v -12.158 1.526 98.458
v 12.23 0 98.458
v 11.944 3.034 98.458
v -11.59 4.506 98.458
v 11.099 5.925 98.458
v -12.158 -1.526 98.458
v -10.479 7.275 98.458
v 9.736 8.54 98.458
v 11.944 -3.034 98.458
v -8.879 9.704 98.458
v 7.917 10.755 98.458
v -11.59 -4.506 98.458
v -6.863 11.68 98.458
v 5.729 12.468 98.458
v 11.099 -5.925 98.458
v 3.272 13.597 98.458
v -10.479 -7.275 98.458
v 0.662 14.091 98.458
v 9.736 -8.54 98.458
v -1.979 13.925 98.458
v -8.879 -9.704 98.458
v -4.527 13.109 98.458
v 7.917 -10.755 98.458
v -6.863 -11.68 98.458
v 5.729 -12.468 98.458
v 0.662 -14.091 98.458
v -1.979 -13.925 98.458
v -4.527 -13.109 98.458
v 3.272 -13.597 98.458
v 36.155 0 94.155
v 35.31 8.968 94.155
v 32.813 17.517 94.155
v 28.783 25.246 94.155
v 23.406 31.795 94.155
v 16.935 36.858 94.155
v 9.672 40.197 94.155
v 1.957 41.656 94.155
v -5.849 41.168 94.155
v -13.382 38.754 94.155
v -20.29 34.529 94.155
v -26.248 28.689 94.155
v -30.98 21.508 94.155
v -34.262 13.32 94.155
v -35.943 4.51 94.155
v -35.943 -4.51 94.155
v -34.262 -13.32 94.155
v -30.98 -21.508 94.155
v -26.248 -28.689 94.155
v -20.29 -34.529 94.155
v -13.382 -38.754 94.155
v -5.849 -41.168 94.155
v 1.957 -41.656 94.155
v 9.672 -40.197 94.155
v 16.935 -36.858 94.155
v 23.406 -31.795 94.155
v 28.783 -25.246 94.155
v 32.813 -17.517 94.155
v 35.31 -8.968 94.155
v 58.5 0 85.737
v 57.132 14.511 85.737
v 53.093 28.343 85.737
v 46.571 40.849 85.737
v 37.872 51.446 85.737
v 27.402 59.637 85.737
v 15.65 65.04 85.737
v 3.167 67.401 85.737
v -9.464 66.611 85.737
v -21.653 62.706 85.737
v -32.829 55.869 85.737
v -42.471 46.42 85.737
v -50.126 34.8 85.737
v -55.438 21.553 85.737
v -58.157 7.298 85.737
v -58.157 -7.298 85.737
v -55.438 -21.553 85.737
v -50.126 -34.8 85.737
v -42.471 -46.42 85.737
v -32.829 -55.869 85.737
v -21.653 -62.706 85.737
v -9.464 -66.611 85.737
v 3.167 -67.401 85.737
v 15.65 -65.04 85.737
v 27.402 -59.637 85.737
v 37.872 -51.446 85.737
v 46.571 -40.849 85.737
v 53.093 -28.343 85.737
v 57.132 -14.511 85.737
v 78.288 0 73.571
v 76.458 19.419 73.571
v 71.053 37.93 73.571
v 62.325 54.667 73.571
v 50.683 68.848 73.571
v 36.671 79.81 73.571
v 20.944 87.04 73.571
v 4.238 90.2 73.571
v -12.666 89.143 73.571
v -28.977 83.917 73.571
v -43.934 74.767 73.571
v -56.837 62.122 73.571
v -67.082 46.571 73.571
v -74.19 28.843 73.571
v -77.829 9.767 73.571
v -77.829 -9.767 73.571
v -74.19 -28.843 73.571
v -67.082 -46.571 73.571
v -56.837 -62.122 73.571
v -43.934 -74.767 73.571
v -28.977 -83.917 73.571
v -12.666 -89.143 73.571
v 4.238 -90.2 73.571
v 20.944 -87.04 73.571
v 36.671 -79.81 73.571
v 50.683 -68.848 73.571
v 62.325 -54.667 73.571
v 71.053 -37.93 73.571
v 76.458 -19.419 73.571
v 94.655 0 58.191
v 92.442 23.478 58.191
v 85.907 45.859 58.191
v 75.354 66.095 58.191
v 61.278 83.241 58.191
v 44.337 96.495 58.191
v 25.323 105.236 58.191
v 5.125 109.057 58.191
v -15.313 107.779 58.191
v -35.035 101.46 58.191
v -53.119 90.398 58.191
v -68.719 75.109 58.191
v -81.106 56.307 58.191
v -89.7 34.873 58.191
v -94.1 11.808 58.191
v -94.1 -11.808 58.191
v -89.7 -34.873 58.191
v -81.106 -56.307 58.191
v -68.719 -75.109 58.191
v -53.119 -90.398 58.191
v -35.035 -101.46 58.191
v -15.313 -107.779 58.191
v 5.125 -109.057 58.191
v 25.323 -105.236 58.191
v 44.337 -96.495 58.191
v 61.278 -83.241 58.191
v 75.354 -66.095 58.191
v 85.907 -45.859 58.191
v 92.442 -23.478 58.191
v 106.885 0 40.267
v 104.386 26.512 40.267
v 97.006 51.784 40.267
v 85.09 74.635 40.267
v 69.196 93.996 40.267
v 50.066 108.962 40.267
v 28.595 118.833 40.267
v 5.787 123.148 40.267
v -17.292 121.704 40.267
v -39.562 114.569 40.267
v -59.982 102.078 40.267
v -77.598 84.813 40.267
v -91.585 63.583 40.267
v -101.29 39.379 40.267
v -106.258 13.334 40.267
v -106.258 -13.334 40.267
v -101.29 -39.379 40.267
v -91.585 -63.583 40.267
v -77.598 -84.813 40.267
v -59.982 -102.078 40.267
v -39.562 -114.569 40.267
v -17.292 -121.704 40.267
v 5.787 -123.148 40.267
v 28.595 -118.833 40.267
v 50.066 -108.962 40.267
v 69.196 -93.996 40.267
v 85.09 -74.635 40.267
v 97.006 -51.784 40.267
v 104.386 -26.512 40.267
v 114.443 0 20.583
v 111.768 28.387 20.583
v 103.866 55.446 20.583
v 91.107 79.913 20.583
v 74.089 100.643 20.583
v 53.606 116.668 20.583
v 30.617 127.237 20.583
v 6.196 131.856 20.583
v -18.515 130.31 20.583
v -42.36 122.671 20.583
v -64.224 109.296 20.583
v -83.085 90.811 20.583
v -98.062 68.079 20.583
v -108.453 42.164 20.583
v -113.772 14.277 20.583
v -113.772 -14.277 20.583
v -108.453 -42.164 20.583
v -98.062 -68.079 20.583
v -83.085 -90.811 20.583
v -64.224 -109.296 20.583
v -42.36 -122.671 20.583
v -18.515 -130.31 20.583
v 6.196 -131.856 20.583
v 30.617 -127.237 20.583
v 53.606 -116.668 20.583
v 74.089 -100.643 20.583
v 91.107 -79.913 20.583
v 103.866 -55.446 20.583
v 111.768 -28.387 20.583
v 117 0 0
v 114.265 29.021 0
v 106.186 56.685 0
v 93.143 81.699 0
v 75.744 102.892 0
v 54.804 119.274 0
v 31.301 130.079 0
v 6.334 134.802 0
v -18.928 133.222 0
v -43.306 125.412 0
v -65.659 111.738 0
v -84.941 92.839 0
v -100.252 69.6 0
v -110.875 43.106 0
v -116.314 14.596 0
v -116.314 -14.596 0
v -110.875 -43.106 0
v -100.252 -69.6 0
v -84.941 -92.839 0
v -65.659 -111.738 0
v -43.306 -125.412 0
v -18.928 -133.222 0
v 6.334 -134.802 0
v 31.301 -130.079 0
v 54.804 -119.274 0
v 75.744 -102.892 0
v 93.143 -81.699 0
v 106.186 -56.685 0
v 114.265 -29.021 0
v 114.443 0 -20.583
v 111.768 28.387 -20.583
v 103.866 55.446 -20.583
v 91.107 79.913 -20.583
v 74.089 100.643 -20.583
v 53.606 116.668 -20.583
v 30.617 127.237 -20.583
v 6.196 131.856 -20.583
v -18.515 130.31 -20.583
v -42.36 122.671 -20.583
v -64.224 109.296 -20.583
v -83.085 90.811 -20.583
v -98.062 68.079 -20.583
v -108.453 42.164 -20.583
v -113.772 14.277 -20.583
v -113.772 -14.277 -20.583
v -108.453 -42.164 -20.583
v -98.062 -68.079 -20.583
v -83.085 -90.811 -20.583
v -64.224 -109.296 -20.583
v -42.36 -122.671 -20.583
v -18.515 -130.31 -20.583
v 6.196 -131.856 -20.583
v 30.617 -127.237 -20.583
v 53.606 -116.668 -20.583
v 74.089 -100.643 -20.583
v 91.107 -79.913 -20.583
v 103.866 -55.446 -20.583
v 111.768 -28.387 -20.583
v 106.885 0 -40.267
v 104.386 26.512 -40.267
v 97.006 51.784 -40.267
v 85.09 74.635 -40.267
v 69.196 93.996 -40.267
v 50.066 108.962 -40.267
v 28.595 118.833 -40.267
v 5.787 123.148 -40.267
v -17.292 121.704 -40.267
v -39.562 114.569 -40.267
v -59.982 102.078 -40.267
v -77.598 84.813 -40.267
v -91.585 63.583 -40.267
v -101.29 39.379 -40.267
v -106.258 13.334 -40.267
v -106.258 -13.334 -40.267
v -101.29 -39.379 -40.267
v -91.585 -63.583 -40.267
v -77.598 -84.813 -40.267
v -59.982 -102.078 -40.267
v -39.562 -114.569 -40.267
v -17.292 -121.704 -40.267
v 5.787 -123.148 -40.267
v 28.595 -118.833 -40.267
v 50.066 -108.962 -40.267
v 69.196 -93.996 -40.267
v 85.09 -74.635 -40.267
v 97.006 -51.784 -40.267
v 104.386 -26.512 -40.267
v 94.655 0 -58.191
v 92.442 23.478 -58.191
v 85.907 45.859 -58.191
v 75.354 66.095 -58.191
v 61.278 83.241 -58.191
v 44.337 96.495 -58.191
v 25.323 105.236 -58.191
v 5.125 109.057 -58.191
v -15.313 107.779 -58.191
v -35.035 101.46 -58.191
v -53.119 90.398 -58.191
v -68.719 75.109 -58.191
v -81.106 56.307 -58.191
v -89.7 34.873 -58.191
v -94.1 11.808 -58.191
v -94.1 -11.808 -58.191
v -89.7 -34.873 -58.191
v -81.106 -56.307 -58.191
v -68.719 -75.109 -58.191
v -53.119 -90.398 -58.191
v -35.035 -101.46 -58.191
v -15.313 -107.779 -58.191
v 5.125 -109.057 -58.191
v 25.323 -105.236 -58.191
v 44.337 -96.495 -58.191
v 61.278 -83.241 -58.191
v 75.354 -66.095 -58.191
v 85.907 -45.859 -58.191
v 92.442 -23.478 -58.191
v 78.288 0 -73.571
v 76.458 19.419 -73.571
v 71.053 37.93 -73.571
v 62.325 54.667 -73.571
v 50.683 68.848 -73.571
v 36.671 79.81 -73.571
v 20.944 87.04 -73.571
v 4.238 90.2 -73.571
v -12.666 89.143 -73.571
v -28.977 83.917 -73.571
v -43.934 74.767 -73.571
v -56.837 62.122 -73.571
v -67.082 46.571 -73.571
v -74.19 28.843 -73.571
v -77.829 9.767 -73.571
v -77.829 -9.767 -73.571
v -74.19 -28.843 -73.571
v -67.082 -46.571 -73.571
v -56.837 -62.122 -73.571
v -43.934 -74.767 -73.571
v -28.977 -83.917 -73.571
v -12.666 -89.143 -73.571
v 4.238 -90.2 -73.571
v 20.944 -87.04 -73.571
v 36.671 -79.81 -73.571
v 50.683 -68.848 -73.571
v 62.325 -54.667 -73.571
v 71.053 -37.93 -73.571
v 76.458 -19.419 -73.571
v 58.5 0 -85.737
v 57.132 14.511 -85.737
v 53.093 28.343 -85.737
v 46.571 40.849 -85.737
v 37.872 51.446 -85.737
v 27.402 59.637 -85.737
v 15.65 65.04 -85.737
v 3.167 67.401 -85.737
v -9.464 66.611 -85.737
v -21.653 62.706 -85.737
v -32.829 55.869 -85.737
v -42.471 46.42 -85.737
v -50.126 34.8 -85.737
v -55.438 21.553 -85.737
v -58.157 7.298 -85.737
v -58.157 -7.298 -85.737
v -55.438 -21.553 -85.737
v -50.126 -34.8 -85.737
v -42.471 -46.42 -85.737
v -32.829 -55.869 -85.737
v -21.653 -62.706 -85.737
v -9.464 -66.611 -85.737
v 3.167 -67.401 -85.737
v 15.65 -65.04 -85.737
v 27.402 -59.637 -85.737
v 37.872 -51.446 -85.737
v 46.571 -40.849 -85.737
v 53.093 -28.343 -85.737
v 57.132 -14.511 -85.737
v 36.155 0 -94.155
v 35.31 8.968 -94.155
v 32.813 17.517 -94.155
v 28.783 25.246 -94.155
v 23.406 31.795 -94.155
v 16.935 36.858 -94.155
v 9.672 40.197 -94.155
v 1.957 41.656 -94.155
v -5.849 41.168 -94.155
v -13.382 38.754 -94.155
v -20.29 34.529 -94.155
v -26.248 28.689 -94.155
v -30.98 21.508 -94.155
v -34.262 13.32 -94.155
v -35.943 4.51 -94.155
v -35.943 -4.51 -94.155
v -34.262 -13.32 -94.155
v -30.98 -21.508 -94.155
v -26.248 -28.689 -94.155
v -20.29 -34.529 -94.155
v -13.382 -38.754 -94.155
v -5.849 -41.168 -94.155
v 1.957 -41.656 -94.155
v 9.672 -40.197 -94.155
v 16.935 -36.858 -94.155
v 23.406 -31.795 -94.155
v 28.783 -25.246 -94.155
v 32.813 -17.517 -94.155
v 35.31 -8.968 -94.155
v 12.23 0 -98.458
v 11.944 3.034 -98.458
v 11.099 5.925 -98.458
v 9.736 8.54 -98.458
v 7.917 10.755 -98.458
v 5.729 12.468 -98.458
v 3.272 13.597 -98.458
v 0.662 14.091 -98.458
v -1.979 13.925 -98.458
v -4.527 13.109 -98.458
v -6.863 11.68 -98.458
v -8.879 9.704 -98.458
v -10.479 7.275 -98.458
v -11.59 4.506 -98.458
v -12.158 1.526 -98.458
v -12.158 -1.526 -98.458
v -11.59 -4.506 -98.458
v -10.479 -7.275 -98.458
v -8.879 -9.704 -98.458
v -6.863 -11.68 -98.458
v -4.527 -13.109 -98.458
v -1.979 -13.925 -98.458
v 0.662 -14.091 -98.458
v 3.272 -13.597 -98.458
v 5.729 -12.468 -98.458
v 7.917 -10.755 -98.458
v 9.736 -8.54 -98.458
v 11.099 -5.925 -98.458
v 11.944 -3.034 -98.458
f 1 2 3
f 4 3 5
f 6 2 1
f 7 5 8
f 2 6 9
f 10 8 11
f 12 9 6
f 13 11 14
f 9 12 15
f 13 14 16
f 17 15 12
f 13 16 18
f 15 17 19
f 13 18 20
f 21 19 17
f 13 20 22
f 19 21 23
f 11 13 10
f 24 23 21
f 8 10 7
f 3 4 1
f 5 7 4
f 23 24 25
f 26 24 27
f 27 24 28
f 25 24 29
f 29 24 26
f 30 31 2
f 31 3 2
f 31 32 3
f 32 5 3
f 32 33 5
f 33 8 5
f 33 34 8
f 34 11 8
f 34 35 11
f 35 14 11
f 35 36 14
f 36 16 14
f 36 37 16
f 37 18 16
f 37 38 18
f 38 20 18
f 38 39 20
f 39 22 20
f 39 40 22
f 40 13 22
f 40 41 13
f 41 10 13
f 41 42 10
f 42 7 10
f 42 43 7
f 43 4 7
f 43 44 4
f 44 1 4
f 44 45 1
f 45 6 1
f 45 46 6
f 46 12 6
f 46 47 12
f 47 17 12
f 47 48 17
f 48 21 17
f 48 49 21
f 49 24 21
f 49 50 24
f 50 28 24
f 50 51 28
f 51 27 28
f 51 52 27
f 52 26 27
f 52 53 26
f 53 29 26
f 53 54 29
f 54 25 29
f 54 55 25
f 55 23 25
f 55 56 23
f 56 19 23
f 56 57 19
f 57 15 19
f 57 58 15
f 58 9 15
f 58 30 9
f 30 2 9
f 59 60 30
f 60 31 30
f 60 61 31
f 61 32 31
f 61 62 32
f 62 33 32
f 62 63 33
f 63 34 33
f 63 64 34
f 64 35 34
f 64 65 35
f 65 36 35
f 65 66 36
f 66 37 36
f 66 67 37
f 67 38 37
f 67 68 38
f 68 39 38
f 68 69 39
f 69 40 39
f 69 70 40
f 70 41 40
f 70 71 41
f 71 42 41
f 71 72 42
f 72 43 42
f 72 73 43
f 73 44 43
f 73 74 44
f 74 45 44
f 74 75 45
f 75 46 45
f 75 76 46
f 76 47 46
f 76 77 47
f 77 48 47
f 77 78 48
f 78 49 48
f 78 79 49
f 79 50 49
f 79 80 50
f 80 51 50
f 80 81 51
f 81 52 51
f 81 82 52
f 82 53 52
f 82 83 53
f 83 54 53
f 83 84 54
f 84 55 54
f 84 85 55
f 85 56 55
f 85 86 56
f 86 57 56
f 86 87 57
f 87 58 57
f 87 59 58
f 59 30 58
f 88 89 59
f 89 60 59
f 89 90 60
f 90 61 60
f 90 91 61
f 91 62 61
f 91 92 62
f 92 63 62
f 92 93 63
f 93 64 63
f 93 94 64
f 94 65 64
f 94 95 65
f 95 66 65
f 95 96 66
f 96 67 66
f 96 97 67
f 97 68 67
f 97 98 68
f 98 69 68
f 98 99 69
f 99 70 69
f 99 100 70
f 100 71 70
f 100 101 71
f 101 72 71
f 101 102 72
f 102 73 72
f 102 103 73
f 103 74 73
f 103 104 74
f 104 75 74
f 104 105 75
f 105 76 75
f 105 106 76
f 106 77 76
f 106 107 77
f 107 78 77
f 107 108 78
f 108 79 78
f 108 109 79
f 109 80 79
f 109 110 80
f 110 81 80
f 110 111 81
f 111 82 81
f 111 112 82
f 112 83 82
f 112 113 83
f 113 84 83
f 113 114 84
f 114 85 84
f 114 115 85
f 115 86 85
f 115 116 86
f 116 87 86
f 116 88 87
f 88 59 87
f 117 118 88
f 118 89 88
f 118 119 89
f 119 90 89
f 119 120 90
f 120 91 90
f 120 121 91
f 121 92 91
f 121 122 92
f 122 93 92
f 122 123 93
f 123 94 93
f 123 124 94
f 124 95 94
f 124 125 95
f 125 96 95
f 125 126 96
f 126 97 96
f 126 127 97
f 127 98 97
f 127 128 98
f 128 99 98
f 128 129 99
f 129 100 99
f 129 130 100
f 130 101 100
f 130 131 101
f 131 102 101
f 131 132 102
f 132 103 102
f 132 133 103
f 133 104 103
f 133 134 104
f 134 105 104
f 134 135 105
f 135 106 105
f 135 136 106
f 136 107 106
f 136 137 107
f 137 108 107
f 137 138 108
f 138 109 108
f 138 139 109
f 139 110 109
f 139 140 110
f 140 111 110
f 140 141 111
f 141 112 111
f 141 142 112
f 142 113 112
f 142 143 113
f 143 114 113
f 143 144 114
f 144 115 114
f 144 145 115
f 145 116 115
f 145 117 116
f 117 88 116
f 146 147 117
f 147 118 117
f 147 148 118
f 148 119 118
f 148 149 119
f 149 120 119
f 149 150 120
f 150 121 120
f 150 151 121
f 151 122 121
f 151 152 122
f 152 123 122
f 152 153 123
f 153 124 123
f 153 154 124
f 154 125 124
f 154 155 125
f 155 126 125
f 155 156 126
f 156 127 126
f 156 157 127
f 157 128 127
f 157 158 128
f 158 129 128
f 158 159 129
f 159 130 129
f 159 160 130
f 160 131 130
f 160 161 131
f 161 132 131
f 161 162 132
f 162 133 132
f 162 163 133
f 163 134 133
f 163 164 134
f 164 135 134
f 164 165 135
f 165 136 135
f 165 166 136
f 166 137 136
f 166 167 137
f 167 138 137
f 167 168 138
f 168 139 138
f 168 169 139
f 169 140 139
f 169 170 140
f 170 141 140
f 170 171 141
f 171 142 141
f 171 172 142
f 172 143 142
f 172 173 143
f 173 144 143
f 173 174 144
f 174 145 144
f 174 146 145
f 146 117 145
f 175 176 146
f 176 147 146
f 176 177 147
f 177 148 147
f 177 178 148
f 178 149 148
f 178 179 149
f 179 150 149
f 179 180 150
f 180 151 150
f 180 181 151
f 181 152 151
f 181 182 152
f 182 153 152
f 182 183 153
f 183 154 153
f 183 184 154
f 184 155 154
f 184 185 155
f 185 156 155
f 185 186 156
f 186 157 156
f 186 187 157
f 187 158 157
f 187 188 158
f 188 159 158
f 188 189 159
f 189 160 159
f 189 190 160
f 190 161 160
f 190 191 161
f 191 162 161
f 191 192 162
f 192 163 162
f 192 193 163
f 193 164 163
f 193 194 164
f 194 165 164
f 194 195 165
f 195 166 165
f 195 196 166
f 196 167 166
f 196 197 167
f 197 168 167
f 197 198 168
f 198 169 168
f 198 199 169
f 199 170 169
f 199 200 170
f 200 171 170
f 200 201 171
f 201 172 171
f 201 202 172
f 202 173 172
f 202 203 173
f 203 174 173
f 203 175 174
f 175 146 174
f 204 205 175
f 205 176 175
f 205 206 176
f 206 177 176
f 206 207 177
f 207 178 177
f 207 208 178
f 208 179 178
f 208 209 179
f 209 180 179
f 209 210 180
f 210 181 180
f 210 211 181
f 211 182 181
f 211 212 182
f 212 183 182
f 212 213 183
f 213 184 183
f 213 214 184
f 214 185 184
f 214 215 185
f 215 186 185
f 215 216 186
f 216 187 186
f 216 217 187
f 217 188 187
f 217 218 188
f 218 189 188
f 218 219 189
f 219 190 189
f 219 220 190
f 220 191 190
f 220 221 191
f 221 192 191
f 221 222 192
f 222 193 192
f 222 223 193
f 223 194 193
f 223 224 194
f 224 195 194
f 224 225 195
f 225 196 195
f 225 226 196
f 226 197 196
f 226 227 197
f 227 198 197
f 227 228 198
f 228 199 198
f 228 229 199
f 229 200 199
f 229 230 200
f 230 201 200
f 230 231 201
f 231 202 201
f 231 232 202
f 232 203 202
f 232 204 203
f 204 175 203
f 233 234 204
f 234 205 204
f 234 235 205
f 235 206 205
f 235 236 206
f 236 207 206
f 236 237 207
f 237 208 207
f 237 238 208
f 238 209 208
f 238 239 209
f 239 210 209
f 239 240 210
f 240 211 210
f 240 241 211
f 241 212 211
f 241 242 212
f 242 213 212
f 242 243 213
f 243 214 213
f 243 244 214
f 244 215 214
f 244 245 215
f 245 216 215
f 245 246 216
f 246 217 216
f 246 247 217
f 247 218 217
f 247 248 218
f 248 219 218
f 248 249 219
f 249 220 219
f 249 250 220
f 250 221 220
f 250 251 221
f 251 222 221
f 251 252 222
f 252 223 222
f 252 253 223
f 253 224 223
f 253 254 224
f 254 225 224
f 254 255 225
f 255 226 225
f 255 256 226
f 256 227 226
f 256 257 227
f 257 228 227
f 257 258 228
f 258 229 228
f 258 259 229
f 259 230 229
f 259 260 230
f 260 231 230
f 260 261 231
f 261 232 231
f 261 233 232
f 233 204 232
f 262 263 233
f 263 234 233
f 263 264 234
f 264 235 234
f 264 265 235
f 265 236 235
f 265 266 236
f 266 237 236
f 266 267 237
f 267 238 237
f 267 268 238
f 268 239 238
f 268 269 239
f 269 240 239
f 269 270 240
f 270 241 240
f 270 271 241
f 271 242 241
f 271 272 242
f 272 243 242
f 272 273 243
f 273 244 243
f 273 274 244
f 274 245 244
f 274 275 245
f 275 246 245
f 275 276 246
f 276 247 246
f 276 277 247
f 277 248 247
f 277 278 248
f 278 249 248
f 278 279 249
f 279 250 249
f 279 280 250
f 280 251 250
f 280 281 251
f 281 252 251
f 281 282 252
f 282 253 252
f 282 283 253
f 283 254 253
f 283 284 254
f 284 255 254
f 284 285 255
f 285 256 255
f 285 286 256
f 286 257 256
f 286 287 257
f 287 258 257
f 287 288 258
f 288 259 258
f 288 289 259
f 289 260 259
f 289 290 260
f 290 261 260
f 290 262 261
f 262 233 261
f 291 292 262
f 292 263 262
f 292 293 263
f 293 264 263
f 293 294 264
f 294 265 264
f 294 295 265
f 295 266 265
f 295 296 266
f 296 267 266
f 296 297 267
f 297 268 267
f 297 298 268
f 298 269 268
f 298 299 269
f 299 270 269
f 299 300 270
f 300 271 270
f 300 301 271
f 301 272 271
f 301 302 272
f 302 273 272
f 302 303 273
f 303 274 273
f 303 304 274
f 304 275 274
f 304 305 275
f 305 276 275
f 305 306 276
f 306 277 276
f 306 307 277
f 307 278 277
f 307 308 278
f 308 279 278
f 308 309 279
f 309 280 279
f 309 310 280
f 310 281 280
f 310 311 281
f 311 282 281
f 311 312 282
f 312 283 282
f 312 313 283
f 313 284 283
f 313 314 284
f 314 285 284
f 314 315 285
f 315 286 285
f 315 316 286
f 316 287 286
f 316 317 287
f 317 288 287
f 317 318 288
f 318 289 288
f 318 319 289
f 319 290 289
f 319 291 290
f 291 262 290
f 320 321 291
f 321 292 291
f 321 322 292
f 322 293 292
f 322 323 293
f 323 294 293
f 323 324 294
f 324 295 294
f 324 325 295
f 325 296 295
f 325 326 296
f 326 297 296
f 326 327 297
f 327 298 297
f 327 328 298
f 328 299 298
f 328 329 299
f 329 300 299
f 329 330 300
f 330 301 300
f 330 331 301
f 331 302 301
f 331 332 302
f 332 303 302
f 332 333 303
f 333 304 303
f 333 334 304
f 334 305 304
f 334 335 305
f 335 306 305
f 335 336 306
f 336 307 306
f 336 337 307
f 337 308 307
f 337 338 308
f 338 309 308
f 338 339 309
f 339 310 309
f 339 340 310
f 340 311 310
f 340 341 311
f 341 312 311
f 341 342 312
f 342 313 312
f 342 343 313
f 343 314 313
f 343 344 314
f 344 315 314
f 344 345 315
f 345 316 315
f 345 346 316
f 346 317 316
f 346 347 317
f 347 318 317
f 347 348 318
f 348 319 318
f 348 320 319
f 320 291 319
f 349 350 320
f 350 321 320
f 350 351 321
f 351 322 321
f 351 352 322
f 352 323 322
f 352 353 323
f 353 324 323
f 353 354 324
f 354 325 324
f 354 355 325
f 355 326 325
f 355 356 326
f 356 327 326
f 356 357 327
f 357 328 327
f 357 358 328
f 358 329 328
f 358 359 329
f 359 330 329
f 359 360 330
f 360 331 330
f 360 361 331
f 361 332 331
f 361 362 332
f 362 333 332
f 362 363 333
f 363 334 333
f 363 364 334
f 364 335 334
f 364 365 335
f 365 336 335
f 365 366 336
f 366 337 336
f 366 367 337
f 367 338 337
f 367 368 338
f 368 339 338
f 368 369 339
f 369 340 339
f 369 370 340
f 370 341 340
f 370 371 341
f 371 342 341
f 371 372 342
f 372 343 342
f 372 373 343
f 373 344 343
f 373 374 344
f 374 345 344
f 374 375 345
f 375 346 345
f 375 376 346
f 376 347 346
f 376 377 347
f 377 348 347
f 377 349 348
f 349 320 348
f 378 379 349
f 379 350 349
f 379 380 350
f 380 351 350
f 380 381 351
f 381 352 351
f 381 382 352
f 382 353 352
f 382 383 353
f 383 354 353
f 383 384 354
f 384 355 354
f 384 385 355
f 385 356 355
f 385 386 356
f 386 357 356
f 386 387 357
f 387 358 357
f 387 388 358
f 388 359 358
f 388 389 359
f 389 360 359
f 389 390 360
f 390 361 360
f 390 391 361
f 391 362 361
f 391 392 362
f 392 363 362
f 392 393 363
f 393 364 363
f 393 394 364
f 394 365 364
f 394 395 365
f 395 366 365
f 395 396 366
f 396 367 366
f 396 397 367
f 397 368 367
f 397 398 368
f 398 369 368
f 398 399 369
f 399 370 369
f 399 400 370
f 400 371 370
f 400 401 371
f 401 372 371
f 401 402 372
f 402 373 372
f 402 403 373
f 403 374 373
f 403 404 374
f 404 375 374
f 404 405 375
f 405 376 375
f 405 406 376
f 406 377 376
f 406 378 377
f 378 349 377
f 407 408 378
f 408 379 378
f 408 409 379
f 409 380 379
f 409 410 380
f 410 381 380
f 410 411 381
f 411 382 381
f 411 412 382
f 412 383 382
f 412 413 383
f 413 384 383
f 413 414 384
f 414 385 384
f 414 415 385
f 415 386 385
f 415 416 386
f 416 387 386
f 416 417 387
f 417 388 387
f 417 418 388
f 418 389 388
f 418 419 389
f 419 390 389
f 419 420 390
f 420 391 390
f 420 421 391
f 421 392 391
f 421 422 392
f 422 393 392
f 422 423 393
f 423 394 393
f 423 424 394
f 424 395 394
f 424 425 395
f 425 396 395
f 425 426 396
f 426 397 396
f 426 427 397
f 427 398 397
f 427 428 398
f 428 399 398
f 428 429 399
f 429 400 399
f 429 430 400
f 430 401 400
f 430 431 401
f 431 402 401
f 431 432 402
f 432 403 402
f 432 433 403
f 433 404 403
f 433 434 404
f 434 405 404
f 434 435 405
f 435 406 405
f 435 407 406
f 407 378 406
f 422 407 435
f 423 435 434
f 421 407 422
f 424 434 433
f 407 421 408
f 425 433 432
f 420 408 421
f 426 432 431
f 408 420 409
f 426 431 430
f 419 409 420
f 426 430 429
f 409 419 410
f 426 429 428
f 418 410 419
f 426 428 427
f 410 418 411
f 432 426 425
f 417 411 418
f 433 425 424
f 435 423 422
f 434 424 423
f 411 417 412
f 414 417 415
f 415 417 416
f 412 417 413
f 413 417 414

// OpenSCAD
// Generated by SolidPython 1.0.1 on 2020-07-29 00:46:51


scale(v = [13, 15, 11]) {
	sphere(r = 9);
}
/***********************************************
*********      SolidPython code:      **********
************************************************
 
# import packages: SolidPython
from solid import *
from solid.utils import *
from itertools import chain, combinations, permutations


class Resize:

    def __init__(self, scad_file):
        self.scad_file = scad_file
        #self.scad_file = import_scad(scad_file)
        # cone/cylinder param:
        self.r1 = 0
        self.r2 = 0
        self.h = 0
        # rectangular prism param:
        self.w = 0
        self.l = 0
        # ellipse param:
        self.r = 0

    # import OpenScad code (file name corresponds to shape)


    # classify shape + parameters
    def assign(self, param1, param2, param3):
        if self.scad_file == 'cone.scad':
            self.r1 = param1
            self.r2 = param2
            self.h = param3
        elif self.scad_file == 'cylinder.scad':
            self.r1 = param1
            self.r2 = param2
            self.h = param3
        elif self.scad_file == 'rectangularPrism.scad':
            self.h = param1
            self.l = param2
            self.w = param3
        else:
            self.r = param1
            self.h = param2

    # resize parameters
    def iterate(self):
        x = range(3, 20, 2)
        i = 1
        if self.scad_file == 'cone.scad':
            tempList = list(permutations(x, 2))
            for temp in tempList:
                param1 = temp[0]
                param2 = temp[1]
                filepath = 'produced_scad_files/' + 'cone' + str(param1) + '_' + str(param2) + '_' + '.scad'
                scad_render_to_file(cylinder(h=param1, r1=param2, r2=0), filepath)

        elif self.scad_file == 'cylinder.scad':
            tempList = list(permutations(x, 3))
            for temp in tempList:
                param1 = temp[0]
                param2 = temp[1]
                filepath = 'produced_scad_files/' + 'cylinder' + str(param1) + '_' + str(param2) + '_' + '.scad'
                scad_render_to_file(cylinder(h=param1, r1=param2, r2=param2), filepath)

        elif self.scad_file == 'rectangularPrism.scad':
            tempList = list(permutations(x, 3))
            for temp in tempList:
                param1 = temp[0]
                param2 = temp[1]
                param3 = temp[2]
                filepath = 'produced_scad_files/' + 'rectangularPrism' + str(param1) + '_' + str(param2) + '_' + str(
                    param3) + '.scad'
                scad_render_to_file(cube(size=(param1, param2, param3)), filepath)

        elif self.scad_file == 'ellipse.scad':
            tempList = list(permutations(x, 4))
            for temp in tempList:
                param1 = temp[0]
                param2 = temp[1]
                param3 = temp[2]
                param4 = temp[3]
                filepath = 'produced_scad_files/' + 'ellipse' + str(param1) + '_' + str(param2) + '_' + str(param3) + '_' + str(param4) + '.scad'
                scad_render_to_file(scale([param1, param2, param3])(sphere(r=param4)), filepath)

    def render_to_scadfile(self):
        scad_render_to_file(scad, 'example.scad') 
 
************************************************/
